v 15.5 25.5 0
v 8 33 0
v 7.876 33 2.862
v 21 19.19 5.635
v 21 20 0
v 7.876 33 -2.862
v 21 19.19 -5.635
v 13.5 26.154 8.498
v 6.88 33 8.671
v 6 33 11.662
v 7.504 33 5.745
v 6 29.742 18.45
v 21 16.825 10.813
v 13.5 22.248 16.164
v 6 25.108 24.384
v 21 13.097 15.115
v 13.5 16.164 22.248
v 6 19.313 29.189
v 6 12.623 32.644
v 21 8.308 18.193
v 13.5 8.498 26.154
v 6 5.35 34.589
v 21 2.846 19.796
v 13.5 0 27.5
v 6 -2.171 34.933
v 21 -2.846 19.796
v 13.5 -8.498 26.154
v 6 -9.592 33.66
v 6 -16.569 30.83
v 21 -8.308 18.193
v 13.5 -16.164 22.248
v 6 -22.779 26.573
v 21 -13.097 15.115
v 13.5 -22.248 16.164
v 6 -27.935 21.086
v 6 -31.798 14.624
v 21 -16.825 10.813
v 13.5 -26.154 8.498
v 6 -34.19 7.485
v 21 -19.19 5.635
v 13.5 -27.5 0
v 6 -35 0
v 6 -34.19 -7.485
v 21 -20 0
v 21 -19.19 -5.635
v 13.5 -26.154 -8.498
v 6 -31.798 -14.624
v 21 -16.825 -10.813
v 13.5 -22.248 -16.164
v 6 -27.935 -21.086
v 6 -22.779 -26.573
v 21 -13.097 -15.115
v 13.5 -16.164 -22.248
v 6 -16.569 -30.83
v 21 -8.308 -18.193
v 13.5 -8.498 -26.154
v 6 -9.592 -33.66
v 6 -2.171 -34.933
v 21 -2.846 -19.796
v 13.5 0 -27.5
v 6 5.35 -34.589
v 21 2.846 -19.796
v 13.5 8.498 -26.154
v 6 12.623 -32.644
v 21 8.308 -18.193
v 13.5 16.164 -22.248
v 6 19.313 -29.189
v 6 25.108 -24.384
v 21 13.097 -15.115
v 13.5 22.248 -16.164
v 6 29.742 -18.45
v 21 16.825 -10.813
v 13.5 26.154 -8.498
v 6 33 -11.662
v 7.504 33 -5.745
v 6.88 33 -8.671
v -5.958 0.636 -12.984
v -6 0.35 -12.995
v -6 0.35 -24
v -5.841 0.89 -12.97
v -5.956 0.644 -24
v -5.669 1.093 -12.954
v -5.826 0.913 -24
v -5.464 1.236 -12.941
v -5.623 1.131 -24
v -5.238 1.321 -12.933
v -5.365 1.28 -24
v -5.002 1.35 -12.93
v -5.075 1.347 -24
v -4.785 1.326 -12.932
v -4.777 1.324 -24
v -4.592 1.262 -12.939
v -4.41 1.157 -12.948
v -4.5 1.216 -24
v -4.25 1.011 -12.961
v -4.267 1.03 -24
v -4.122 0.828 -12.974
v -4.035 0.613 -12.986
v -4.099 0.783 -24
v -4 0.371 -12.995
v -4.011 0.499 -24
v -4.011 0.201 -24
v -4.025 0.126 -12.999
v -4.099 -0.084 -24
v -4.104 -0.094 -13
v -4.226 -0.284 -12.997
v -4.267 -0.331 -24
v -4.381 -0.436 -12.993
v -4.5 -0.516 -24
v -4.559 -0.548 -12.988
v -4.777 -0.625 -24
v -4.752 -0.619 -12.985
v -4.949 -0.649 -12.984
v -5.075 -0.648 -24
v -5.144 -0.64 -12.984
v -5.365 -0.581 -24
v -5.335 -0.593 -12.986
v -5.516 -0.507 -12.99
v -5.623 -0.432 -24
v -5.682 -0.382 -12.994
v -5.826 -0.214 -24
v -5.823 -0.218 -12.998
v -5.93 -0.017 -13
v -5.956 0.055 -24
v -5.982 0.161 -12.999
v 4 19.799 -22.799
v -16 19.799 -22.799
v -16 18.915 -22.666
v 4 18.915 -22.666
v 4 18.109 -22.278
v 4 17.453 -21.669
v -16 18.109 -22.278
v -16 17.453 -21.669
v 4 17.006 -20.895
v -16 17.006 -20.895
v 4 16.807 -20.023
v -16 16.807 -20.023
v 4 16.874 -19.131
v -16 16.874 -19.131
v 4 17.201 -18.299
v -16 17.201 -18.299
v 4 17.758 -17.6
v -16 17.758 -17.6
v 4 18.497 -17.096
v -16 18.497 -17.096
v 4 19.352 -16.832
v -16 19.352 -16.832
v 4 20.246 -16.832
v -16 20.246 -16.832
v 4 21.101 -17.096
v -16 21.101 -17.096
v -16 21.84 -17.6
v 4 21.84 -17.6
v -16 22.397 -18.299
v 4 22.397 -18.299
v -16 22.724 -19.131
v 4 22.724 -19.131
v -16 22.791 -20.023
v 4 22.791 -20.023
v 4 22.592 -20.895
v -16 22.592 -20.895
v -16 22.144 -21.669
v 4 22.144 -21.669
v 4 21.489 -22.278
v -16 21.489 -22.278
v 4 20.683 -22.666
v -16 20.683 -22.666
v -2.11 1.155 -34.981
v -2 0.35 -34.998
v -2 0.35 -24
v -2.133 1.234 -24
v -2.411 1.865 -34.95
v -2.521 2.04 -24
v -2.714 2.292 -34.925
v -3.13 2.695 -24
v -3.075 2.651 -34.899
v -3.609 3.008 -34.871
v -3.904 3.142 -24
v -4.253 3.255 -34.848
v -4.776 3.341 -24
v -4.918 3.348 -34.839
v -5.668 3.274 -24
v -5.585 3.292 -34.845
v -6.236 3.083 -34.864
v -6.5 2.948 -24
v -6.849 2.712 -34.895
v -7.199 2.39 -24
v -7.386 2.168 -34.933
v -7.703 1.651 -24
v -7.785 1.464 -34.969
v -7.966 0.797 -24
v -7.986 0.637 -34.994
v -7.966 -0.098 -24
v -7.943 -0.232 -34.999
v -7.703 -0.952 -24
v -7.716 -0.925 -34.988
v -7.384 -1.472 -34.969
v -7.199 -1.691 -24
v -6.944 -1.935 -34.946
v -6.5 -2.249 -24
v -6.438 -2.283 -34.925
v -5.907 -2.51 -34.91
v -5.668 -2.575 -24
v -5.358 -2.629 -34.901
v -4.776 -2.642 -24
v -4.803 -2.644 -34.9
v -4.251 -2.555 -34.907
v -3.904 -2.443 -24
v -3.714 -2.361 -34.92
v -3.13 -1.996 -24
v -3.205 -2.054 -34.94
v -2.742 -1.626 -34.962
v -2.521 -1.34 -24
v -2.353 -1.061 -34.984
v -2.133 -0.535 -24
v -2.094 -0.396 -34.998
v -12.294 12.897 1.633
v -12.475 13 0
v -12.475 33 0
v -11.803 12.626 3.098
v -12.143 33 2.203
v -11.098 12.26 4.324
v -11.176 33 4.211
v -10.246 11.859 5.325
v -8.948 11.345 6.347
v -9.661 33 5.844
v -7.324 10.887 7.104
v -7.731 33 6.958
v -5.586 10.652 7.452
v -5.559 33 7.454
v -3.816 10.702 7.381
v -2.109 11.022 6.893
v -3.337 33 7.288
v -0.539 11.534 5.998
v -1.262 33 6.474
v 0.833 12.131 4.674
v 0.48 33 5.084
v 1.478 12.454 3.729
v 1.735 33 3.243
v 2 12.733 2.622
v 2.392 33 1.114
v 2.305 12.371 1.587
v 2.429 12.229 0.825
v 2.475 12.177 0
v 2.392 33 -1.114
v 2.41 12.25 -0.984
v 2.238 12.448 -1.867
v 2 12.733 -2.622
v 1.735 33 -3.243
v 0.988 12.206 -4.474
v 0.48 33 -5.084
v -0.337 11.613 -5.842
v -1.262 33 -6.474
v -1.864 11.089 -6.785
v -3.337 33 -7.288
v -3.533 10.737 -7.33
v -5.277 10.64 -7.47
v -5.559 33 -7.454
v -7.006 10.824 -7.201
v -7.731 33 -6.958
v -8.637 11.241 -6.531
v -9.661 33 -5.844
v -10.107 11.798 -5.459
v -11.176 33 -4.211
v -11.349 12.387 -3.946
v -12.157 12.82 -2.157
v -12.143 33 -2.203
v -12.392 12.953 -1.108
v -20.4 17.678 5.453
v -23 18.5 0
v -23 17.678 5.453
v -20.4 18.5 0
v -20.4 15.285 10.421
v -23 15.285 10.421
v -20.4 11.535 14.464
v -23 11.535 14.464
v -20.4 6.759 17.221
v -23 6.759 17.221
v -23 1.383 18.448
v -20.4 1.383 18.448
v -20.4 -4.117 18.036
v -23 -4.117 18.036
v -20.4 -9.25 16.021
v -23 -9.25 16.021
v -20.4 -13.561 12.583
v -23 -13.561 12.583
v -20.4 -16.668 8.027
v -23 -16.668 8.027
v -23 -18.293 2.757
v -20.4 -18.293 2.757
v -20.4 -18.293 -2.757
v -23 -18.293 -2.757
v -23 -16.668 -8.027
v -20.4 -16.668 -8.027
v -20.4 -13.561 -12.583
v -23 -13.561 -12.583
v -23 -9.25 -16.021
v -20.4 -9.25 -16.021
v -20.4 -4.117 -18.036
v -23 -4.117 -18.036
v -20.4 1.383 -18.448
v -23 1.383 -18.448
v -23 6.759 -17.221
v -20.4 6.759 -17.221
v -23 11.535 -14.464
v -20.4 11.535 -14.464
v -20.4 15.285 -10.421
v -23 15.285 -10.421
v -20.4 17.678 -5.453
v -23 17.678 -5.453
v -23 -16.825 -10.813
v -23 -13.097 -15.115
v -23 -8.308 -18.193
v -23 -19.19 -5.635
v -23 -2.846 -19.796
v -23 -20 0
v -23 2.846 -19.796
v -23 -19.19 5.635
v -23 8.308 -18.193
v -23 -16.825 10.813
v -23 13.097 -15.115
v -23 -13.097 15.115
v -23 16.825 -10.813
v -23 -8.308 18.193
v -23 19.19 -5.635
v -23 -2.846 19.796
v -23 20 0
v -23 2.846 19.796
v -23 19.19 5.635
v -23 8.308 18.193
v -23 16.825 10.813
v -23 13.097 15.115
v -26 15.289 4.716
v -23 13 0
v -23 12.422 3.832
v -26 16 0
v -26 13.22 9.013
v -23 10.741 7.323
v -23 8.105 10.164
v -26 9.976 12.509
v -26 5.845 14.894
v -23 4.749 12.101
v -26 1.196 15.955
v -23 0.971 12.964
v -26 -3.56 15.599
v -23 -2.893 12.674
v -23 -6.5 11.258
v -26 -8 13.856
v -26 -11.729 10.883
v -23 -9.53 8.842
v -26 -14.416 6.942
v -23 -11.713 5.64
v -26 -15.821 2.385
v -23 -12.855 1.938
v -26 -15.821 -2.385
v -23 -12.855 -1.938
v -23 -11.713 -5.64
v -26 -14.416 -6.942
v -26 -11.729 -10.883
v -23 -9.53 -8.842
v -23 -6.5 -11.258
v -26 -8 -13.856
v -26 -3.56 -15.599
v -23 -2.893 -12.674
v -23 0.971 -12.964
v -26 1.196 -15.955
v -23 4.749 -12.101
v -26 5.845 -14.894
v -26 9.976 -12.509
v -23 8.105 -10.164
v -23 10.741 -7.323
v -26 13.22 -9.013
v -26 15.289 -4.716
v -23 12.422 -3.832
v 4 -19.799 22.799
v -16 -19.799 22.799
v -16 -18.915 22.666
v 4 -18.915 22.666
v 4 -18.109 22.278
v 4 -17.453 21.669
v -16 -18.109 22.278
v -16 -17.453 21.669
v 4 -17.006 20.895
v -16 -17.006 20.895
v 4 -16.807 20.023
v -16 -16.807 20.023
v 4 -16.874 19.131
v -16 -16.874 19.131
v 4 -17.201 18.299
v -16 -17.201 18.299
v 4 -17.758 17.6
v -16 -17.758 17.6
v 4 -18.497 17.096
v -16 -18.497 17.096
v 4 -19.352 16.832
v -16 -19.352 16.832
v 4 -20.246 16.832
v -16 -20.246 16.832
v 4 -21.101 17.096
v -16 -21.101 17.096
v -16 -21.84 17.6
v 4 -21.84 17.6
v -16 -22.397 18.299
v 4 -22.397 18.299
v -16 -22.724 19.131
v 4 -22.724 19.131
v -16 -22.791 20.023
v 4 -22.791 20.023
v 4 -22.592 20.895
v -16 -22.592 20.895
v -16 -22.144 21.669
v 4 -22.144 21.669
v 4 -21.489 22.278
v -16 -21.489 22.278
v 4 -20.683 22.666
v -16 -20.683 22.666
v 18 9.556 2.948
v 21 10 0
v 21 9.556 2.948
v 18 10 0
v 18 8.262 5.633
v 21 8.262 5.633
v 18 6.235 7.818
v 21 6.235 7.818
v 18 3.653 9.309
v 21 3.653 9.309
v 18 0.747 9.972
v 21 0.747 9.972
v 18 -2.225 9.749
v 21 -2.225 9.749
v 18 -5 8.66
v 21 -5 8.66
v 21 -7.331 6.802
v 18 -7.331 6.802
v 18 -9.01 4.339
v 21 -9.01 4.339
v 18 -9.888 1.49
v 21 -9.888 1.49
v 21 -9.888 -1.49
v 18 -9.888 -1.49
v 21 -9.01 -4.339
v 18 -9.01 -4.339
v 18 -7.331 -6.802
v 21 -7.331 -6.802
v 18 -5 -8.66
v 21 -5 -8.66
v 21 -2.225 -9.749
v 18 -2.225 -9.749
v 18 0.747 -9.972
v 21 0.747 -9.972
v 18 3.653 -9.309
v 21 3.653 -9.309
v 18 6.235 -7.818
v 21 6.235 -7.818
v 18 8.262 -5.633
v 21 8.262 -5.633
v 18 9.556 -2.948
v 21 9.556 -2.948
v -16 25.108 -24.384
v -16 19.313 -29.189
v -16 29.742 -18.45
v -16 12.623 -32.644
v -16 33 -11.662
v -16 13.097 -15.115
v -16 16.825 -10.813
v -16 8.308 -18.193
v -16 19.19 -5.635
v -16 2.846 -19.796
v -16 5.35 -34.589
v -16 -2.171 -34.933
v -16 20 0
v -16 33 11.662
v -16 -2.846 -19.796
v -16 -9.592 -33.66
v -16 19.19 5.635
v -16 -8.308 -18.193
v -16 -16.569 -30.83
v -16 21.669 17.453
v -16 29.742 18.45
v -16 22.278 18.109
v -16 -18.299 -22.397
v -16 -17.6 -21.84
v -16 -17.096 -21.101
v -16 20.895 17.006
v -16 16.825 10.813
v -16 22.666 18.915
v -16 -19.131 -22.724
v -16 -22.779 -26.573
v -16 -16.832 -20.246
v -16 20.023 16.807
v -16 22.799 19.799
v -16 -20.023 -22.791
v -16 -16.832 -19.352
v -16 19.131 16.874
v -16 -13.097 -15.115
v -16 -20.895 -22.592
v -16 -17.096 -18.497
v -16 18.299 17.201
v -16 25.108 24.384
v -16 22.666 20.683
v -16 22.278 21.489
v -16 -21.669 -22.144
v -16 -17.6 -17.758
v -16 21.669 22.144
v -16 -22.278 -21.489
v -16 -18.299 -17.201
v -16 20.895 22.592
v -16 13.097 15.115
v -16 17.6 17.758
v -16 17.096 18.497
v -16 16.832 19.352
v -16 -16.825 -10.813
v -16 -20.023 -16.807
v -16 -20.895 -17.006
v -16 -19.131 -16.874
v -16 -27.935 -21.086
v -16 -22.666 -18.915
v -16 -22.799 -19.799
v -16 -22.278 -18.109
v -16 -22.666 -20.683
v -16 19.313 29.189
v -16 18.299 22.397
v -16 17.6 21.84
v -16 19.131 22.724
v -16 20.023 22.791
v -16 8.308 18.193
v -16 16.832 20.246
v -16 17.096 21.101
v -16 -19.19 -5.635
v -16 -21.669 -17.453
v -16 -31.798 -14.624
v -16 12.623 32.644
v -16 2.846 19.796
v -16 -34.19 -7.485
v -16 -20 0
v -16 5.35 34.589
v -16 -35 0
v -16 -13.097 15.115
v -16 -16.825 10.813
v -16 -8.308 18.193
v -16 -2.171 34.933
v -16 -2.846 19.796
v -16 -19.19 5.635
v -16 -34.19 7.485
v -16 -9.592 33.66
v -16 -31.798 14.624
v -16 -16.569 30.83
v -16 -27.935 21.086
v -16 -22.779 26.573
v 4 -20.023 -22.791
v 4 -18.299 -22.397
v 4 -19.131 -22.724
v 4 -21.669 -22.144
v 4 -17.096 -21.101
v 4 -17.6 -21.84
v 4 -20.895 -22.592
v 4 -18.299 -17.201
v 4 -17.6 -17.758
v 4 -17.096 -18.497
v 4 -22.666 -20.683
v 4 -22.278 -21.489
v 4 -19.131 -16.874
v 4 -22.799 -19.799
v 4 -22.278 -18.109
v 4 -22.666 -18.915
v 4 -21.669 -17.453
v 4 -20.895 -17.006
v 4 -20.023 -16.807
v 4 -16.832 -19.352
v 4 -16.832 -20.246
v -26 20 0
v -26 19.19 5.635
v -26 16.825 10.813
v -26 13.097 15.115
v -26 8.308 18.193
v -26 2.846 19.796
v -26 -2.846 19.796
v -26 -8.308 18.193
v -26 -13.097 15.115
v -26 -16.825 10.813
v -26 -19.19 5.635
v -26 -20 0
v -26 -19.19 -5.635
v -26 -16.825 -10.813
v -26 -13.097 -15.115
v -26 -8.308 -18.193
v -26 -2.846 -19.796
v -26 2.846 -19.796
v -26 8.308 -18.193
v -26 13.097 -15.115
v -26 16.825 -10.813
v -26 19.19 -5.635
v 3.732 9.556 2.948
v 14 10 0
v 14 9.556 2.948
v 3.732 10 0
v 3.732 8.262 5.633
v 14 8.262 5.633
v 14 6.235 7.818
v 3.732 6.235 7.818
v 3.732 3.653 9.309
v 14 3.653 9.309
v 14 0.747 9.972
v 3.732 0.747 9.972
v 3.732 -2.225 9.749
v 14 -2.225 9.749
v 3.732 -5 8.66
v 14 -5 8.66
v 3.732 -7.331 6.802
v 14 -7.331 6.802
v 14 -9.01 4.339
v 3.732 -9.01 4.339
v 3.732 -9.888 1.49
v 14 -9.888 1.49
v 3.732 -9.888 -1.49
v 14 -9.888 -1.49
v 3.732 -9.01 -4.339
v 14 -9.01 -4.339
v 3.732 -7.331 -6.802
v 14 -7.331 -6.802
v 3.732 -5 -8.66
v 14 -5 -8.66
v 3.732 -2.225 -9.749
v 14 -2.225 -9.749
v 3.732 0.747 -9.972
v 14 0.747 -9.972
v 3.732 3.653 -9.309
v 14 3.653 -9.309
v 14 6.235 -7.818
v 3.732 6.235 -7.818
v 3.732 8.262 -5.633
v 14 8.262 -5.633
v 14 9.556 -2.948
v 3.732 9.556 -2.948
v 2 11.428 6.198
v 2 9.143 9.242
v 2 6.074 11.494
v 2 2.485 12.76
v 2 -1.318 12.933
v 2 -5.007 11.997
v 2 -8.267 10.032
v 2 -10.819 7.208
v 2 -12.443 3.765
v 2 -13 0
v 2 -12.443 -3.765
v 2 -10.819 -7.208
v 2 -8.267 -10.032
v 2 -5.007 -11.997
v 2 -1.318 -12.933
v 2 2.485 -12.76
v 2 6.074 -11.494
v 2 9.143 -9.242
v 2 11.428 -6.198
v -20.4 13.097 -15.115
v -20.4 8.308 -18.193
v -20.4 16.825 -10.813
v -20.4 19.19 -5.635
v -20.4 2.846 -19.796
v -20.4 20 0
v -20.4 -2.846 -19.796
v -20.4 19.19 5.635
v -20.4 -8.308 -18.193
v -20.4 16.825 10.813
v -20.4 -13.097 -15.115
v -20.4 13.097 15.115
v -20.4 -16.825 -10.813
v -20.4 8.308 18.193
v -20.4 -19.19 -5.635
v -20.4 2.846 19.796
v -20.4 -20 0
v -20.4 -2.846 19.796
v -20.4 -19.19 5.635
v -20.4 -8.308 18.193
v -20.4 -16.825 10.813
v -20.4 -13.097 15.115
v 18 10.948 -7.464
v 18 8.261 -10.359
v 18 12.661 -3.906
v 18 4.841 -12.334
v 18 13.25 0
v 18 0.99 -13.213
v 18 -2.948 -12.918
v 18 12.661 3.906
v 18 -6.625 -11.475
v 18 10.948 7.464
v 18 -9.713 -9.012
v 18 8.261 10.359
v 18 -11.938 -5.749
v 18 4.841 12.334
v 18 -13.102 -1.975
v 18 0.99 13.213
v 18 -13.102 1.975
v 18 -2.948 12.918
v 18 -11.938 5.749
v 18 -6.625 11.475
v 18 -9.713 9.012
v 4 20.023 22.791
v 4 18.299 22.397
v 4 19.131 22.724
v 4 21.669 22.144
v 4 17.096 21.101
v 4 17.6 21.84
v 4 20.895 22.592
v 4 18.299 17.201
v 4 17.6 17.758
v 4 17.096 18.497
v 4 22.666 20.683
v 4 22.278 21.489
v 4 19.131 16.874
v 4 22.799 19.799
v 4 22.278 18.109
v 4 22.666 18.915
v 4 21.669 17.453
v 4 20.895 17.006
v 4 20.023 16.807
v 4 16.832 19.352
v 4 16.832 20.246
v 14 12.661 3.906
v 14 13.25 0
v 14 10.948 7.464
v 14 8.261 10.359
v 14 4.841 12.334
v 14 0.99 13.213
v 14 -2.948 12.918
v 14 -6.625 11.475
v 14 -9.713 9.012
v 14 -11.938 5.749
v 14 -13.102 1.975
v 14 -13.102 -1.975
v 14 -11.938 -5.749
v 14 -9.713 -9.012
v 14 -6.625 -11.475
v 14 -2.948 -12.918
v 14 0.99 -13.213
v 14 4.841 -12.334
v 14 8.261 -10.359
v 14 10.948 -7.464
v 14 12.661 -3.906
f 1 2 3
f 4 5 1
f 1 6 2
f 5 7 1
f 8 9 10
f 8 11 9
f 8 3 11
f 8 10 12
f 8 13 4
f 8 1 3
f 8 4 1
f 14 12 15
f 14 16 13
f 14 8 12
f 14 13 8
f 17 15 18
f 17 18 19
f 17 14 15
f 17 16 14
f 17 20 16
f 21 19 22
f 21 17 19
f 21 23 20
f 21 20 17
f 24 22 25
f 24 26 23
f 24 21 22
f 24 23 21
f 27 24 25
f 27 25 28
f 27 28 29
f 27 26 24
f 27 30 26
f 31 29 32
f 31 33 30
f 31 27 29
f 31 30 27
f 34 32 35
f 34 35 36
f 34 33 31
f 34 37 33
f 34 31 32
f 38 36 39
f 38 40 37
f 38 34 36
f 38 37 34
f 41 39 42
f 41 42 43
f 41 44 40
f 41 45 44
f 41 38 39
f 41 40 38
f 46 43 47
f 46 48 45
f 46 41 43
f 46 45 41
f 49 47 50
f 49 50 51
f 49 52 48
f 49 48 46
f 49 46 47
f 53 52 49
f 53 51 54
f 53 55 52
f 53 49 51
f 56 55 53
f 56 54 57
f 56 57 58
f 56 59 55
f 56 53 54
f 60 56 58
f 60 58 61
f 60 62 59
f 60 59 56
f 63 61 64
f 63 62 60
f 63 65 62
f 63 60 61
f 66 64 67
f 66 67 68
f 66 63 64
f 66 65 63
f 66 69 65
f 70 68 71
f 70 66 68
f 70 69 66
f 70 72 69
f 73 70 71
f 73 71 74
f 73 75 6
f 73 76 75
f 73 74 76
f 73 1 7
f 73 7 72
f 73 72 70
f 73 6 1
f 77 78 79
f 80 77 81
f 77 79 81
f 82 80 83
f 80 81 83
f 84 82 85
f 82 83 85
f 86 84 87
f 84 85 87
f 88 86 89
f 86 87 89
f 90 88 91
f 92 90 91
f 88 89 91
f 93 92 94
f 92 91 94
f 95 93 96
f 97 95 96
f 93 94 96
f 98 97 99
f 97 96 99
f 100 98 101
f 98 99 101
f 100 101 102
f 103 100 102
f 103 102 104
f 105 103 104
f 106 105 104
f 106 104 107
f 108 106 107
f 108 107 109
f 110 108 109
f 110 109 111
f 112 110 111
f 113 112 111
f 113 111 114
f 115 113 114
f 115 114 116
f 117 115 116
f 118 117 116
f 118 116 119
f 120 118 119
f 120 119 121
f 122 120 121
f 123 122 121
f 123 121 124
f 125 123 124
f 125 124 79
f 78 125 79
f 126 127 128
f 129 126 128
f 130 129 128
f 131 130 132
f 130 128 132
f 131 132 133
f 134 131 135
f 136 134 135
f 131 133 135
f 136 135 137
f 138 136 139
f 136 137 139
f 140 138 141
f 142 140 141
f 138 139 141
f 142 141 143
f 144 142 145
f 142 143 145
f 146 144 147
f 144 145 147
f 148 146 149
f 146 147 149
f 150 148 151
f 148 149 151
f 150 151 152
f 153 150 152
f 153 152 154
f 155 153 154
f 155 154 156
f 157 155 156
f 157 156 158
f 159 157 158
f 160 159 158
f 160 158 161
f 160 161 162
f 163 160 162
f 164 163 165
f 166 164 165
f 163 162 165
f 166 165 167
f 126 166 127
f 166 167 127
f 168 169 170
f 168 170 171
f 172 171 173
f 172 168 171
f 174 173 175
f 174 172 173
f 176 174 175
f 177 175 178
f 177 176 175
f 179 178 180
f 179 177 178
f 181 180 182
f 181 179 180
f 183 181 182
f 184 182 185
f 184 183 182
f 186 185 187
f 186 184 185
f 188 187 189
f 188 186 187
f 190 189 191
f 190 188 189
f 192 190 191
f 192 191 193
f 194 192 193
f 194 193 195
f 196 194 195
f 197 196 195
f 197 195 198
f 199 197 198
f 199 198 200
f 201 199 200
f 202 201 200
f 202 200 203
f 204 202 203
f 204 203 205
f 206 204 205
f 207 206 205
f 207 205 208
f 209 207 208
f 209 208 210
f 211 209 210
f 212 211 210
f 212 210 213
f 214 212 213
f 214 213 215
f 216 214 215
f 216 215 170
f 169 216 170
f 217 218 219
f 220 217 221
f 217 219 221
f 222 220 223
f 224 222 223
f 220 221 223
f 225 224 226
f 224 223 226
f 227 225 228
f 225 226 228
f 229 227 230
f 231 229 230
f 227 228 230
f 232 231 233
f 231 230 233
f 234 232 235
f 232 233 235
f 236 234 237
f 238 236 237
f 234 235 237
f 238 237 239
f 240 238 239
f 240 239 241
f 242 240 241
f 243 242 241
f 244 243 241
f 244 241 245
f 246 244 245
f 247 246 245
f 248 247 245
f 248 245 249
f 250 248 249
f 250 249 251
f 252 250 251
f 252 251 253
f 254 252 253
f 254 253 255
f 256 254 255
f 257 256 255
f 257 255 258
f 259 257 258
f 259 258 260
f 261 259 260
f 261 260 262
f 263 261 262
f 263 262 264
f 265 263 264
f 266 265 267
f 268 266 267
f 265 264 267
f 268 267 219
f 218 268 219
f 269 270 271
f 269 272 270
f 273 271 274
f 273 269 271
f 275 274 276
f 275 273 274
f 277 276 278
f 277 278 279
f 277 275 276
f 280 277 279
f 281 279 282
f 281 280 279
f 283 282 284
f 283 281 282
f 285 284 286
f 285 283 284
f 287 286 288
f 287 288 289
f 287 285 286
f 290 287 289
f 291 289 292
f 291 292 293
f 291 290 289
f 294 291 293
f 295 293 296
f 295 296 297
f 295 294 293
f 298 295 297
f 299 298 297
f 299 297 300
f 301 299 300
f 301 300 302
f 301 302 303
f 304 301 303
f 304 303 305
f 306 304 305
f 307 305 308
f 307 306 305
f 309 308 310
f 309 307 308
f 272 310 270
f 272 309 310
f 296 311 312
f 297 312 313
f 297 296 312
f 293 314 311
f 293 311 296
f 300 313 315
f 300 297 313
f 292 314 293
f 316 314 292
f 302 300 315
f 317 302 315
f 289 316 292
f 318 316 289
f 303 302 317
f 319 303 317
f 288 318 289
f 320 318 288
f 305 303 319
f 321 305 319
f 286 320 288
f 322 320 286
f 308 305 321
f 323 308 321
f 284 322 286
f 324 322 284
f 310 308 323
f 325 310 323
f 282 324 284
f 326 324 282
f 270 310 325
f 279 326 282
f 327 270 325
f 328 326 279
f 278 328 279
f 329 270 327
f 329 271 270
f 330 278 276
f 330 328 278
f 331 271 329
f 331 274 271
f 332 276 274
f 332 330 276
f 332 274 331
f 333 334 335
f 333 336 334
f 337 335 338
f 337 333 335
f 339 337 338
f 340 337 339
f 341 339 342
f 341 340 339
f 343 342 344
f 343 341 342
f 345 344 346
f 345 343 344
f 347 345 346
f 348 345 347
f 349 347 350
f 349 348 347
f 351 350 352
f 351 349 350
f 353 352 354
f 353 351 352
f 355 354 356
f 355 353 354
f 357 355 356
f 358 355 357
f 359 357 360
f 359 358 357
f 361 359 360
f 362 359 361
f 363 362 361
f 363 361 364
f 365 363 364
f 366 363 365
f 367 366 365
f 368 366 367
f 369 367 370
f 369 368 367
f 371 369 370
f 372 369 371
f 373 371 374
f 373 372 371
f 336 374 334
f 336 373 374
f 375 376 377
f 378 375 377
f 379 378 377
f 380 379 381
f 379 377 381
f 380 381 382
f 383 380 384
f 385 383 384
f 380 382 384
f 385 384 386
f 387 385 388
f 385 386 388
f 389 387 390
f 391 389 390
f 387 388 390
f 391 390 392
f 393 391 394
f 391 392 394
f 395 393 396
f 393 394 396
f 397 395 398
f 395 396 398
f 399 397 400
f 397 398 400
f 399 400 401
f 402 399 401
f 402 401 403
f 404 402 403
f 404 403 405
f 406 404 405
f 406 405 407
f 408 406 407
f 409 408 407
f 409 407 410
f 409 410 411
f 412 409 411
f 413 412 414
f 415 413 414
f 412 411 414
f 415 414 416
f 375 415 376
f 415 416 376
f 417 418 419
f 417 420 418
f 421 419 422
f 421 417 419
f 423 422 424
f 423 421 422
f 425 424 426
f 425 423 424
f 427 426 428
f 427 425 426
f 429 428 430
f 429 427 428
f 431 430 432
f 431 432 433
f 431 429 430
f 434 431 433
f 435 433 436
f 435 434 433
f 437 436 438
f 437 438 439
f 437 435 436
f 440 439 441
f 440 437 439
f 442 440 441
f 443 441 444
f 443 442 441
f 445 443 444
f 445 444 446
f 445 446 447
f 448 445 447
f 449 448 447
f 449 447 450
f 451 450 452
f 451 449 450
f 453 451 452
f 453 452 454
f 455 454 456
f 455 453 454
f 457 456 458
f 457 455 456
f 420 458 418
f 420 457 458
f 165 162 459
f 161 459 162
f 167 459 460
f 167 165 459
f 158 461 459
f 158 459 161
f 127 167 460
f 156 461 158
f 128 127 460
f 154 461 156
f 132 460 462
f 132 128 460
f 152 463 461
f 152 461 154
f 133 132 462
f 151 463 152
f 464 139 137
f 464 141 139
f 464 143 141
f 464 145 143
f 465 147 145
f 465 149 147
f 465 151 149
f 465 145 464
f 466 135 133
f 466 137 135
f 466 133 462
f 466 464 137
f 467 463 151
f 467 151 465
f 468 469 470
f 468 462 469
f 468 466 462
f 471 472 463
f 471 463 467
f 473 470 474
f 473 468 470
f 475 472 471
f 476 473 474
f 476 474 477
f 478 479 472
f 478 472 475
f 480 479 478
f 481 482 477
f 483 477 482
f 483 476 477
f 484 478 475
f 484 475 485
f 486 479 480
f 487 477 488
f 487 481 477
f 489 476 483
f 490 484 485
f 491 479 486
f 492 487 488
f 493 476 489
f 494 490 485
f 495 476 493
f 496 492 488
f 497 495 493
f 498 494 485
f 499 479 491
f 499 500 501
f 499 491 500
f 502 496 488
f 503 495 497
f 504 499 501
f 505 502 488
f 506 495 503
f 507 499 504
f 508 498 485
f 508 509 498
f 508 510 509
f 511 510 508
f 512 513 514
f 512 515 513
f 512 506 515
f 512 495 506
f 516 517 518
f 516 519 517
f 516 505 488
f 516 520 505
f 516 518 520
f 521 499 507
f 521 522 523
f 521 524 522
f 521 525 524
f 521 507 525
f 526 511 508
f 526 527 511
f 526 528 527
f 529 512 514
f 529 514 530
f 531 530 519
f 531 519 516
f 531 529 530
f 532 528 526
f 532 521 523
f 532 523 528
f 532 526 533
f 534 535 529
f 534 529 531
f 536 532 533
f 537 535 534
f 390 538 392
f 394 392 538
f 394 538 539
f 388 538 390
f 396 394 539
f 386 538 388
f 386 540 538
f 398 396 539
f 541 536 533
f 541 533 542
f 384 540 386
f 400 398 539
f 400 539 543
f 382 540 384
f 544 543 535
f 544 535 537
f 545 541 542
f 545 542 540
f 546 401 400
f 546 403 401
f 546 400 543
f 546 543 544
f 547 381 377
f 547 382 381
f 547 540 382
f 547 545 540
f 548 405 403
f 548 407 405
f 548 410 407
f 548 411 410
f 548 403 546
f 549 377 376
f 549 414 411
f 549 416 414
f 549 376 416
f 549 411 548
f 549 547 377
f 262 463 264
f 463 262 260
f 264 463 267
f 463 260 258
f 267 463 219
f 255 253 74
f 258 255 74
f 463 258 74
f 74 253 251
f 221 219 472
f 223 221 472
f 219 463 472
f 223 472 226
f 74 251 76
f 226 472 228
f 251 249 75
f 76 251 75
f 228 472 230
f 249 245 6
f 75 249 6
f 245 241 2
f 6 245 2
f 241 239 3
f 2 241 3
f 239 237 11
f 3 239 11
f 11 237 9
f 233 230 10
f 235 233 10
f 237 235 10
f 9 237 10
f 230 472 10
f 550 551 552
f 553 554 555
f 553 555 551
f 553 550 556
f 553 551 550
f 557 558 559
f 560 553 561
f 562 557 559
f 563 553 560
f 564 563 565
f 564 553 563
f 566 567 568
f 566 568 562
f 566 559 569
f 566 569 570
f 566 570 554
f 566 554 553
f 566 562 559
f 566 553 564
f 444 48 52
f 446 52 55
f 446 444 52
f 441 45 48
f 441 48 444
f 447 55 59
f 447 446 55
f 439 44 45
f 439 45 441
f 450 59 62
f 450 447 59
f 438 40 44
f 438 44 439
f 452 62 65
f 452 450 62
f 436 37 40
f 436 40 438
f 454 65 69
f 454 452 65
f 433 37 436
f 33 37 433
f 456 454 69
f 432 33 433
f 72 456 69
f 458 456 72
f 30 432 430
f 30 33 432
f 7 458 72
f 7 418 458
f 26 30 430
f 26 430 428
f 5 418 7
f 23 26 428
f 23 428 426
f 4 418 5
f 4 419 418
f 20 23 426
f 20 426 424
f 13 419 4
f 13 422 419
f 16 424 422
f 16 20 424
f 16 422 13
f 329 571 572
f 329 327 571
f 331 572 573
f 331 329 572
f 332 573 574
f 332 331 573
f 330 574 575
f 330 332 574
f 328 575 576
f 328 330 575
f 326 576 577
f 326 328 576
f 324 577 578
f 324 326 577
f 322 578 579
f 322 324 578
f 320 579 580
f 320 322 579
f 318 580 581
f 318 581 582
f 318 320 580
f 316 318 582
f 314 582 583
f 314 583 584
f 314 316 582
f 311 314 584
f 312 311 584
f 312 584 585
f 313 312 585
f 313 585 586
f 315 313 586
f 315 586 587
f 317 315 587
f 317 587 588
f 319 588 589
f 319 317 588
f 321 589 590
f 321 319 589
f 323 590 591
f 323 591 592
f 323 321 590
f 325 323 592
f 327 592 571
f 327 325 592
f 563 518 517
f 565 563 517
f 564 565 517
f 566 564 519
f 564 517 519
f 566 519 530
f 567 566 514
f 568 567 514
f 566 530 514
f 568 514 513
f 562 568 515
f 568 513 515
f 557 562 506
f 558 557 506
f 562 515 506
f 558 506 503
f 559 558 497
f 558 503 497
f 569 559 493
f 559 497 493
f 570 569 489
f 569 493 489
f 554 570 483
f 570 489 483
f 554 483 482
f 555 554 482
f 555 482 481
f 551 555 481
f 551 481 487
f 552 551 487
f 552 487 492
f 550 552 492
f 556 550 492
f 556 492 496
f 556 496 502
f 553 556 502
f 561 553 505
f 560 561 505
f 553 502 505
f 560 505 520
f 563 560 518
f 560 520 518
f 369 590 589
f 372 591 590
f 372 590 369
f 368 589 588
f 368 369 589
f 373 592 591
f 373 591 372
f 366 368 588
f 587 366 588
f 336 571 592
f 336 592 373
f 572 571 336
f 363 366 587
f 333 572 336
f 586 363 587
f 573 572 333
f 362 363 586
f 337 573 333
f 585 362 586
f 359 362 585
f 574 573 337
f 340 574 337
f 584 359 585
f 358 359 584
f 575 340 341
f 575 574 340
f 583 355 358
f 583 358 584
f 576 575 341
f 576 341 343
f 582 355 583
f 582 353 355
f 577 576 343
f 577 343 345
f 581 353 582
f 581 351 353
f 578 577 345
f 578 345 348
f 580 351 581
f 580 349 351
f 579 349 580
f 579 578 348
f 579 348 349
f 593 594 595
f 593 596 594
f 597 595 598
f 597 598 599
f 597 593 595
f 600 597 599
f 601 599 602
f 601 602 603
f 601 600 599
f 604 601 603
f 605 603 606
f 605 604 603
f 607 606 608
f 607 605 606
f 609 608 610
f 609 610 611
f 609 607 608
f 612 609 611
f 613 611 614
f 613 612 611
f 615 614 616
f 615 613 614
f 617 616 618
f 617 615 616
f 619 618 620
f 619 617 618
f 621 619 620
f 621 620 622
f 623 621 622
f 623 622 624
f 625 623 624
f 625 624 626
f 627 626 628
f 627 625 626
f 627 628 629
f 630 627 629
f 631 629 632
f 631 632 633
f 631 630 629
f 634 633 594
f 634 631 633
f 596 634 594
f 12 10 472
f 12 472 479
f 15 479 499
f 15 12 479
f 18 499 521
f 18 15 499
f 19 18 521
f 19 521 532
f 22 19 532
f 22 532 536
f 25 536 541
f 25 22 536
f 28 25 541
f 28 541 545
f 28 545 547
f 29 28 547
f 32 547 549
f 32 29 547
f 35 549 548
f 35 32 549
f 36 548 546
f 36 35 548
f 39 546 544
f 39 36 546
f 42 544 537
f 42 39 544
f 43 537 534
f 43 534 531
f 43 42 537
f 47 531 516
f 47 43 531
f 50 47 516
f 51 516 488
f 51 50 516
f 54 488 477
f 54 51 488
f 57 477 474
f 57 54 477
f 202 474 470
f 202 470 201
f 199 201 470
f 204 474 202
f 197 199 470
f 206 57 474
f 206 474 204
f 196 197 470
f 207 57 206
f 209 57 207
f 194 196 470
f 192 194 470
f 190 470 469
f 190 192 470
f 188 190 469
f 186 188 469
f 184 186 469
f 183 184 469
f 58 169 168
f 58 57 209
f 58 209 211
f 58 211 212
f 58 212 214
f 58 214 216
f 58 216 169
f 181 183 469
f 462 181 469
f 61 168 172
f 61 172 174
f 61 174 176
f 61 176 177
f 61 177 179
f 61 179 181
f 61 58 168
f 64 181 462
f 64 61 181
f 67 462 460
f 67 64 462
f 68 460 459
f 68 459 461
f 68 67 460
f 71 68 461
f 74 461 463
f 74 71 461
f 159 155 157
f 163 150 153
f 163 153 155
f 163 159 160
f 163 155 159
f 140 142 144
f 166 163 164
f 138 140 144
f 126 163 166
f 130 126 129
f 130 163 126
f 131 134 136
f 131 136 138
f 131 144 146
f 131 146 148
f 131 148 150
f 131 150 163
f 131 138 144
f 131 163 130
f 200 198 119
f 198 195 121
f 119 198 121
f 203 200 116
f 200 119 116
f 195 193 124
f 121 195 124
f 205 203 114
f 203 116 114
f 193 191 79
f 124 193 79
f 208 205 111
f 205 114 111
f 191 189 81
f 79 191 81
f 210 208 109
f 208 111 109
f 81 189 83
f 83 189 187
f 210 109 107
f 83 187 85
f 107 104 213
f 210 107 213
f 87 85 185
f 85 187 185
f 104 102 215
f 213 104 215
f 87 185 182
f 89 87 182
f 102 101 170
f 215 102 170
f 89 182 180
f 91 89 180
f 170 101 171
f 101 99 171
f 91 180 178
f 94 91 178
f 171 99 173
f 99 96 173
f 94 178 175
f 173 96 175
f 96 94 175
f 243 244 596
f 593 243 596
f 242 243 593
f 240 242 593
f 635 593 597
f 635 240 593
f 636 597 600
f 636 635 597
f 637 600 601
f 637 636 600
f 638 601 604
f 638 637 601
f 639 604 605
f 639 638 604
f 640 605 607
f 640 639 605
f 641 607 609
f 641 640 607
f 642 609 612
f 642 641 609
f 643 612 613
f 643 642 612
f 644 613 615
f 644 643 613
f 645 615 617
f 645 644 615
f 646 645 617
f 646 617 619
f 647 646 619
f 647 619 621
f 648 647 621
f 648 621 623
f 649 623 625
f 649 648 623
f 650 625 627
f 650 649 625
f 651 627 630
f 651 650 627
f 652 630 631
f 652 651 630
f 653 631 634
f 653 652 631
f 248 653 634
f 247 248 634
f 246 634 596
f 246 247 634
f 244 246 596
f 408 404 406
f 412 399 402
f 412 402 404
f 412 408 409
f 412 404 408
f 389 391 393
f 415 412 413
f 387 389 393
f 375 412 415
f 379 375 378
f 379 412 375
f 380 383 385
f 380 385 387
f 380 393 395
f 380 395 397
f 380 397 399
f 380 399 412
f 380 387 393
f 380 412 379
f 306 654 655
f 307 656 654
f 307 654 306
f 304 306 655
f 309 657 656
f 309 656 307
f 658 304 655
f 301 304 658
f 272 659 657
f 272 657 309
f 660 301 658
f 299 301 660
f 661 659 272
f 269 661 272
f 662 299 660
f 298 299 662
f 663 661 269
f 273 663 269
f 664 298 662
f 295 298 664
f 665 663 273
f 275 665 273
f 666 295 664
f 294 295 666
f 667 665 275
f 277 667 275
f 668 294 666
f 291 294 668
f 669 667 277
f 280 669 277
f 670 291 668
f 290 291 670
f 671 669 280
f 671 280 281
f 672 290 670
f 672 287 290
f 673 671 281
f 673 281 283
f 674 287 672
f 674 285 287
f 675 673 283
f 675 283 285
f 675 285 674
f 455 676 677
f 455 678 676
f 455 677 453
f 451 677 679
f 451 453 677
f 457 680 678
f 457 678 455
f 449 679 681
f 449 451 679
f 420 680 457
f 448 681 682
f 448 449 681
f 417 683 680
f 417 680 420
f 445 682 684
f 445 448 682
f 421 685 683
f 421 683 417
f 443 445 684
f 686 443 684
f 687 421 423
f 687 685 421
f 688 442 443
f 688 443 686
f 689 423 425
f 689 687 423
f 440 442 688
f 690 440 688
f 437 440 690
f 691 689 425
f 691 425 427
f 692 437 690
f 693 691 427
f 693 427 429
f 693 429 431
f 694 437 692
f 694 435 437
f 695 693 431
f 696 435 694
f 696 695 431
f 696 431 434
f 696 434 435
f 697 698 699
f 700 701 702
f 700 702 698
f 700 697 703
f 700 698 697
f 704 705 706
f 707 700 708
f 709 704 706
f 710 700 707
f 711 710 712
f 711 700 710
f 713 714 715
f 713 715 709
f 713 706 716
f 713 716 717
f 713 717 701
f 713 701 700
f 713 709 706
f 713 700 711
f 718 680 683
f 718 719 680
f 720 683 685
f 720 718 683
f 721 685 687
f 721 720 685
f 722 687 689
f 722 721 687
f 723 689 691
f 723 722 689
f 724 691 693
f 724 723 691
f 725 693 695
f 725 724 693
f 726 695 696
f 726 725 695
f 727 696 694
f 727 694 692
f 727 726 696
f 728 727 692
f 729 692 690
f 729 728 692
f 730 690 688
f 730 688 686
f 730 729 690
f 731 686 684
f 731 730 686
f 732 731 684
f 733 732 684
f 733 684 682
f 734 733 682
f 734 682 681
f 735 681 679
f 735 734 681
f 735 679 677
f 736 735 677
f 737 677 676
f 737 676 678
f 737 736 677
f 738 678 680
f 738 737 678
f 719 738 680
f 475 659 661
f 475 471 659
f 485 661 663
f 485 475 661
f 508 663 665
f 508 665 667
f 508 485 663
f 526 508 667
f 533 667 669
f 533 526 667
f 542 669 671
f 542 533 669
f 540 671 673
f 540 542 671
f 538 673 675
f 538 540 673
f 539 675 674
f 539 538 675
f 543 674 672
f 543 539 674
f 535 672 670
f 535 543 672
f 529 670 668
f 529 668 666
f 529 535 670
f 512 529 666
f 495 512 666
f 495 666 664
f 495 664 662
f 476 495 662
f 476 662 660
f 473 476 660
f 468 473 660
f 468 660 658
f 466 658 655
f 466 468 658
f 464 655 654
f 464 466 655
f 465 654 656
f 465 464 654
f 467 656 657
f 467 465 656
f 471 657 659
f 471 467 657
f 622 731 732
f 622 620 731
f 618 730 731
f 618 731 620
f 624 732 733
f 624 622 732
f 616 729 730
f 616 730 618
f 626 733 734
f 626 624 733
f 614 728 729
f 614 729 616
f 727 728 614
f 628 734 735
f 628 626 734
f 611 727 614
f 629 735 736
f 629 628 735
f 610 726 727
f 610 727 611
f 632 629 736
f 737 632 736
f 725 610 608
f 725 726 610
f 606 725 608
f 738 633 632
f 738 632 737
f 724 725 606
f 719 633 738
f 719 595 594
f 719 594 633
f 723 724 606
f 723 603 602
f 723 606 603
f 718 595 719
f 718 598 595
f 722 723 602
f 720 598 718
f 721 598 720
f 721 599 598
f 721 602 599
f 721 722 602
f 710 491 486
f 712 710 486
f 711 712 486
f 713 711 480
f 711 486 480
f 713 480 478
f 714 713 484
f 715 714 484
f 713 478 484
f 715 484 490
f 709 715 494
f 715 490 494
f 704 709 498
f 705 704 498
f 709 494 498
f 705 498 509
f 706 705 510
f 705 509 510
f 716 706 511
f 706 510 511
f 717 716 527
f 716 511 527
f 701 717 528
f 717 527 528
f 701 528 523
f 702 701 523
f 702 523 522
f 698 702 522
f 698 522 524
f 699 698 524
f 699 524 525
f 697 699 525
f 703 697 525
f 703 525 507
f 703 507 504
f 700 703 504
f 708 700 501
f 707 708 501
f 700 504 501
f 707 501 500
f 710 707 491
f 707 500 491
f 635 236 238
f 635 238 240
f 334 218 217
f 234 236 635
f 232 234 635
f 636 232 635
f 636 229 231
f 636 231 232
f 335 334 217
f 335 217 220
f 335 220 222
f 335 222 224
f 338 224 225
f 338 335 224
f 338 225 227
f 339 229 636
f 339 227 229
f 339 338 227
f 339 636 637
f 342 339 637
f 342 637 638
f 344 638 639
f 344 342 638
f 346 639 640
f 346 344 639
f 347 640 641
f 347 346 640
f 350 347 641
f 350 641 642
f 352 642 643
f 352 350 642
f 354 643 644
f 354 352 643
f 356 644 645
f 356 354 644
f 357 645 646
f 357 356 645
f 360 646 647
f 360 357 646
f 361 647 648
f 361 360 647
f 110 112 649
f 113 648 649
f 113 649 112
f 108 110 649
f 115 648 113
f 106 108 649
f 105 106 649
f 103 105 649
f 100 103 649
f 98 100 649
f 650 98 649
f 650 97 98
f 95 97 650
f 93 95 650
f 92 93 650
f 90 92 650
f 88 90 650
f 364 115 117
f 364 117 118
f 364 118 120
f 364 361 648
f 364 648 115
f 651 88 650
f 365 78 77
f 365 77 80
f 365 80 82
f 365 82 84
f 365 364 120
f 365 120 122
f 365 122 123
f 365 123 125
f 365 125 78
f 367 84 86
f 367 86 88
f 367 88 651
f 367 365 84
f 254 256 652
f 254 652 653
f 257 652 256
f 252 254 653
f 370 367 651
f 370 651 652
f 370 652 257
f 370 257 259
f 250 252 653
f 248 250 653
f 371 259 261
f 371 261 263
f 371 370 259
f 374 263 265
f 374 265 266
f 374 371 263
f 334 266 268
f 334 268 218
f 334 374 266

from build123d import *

# Parameters (mm, degrees)
ESQUISSE2_W                  = 51
ESQUISSE2_H                  = 6
ENL_V_MAT_EXTRU_1_DEPTH      = 25
ENL_V_MAT_EXTRU_2_REACH      = 70
ESQUISSE3_R                  = 7.475
ESQUISSE4_R                  = 3
ENL_V_MAT_EXTRU_3_DEPTH      = 20
R_P_TITION_CIRCULAIRE1_COUNT = 4
ESQUISSE7_R                  = 3
ENL_V_MAT_EXTRU_5_DEPTH      = 11
ENL_V_MAT_EXTRU_6_REACH      = 61
ESQUISSE8_R                  = 1


with BuildPart() as part:
    # Esquisse1 → Base-Révolution (revolve)
    with BuildSketch(Plane.XY):
        Polygon((-26, 16), (-26, 20), (-23, 20), (-23, 18.5), (-20.4, 18.5), (-20.4, 20), (-16, 20), (-16, 35), (6, 35), (21, 20), (21, 10), (18, 10), (18, 13.25), (14, 13.25), (14, 10), (3.732050808, 10), (2, 13), (-23, 13), align=None)
    revolve(axis=Axis((-21, 0, 0), (1, 0, 0)))

    # Esquisse2 → Enlèv. mat.-Extru.1 (cut, symmetric)
    with BuildSketch(Plane.XY):
        with Locations((-5.5, 36)):
            Rectangle(ESQUISSE2_W, ESQUISSE2_H)
    extrude(amount=ENL_V_MAT_EXTRU_1_DEPTH, both=True, mode=Mode.SUBTRACT)

    # Esquisse3 → Enlèv. mat.-Extru.2 (cut, up to next)
    with BuildSketch(Plane(origin=(0, 33, 0), x_dir=(-1, 0, 0), z_dir=(0, 1, 0)), mode=Mode.PRIVATE) as enl_v_mat_extru_2_sk1:
        with Locations((5, 0)):
            Circle(ESQUISSE3_R)
    enl_v_mat_extru_2_tool1 = extrude(enl_v_mat_extru_2_sk1.sketch, amount=-ENL_V_MAT_EXTRU_2_REACH, mode=Mode.PRIVATE) & part.part
    add(enl_v_mat_extru_2_tool1.solids().sort_by_distance((-5, 33, 0))[0], mode=Mode.SUBTRACT)

    # Esquisse4 → Enlèv. mat.-Extru.3 (cut)
    with BuildSketch(Plane.ZY.offset(16)):
        with Locations((19.798989873, -19.798989873)):
            Circle(ESQUISSE4_R)
    enl_v_mat_extru_3 = extrude(amount=-ENL_V_MAT_EXTRU_3_DEPTH, mode=Mode.SUBTRACT)

    # Répétition circulaire1: Enlèv. mat.-Extru.3 ×4 about axis
    r_p_tition_circulaire1_axis = Axis((-21, 0, 0), (1, 0, 0))
    for i in range(1, R_P_TITION_CIRCULAIRE1_COUNT):
        add(enl_v_mat_extru_3.rotate(r_p_tition_circulaire1_axis, i * 360 / R_P_TITION_CIRCULAIRE1_COUNT), mode=Mode.SUBTRACT)

    # Esquisse7 → Enlèv. mat.-Extru.5 (cut)
    with BuildSketch(Plane.XY.offset(-35)):
        with Locations((-5, 0.349567503)):
            Circle(ESQUISSE7_R)
    extrude(amount=ENL_V_MAT_EXTRU_5_DEPTH, mode=Mode.SUBTRACT)

    # Esquisse8 → Enlèv. mat.-Extru.6 (cut, up to next)
    with BuildSketch(Plane(origin=(0, 0, -24), x_dir=(-1, 0, 0), z_dir=(0, 0, -1)), mode=Mode.PRIVATE) as enl_v_mat_extru_6_sk1:
        with Locations((5, 0.349567503)):
            Circle(ESQUISSE8_R)
    enl_v_mat_extru_6_tool1 = extrude(enl_v_mat_extru_6_sk1.sketch, amount=-ENL_V_MAT_EXTRU_6_REACH, mode=Mode.PRIVATE) & part.part
    add(enl_v_mat_extru_6_tool1.solids().sort_by_distance((-5, 0.349568, -24))[0], mode=Mode.SUBTRACT)


solid = part.part
